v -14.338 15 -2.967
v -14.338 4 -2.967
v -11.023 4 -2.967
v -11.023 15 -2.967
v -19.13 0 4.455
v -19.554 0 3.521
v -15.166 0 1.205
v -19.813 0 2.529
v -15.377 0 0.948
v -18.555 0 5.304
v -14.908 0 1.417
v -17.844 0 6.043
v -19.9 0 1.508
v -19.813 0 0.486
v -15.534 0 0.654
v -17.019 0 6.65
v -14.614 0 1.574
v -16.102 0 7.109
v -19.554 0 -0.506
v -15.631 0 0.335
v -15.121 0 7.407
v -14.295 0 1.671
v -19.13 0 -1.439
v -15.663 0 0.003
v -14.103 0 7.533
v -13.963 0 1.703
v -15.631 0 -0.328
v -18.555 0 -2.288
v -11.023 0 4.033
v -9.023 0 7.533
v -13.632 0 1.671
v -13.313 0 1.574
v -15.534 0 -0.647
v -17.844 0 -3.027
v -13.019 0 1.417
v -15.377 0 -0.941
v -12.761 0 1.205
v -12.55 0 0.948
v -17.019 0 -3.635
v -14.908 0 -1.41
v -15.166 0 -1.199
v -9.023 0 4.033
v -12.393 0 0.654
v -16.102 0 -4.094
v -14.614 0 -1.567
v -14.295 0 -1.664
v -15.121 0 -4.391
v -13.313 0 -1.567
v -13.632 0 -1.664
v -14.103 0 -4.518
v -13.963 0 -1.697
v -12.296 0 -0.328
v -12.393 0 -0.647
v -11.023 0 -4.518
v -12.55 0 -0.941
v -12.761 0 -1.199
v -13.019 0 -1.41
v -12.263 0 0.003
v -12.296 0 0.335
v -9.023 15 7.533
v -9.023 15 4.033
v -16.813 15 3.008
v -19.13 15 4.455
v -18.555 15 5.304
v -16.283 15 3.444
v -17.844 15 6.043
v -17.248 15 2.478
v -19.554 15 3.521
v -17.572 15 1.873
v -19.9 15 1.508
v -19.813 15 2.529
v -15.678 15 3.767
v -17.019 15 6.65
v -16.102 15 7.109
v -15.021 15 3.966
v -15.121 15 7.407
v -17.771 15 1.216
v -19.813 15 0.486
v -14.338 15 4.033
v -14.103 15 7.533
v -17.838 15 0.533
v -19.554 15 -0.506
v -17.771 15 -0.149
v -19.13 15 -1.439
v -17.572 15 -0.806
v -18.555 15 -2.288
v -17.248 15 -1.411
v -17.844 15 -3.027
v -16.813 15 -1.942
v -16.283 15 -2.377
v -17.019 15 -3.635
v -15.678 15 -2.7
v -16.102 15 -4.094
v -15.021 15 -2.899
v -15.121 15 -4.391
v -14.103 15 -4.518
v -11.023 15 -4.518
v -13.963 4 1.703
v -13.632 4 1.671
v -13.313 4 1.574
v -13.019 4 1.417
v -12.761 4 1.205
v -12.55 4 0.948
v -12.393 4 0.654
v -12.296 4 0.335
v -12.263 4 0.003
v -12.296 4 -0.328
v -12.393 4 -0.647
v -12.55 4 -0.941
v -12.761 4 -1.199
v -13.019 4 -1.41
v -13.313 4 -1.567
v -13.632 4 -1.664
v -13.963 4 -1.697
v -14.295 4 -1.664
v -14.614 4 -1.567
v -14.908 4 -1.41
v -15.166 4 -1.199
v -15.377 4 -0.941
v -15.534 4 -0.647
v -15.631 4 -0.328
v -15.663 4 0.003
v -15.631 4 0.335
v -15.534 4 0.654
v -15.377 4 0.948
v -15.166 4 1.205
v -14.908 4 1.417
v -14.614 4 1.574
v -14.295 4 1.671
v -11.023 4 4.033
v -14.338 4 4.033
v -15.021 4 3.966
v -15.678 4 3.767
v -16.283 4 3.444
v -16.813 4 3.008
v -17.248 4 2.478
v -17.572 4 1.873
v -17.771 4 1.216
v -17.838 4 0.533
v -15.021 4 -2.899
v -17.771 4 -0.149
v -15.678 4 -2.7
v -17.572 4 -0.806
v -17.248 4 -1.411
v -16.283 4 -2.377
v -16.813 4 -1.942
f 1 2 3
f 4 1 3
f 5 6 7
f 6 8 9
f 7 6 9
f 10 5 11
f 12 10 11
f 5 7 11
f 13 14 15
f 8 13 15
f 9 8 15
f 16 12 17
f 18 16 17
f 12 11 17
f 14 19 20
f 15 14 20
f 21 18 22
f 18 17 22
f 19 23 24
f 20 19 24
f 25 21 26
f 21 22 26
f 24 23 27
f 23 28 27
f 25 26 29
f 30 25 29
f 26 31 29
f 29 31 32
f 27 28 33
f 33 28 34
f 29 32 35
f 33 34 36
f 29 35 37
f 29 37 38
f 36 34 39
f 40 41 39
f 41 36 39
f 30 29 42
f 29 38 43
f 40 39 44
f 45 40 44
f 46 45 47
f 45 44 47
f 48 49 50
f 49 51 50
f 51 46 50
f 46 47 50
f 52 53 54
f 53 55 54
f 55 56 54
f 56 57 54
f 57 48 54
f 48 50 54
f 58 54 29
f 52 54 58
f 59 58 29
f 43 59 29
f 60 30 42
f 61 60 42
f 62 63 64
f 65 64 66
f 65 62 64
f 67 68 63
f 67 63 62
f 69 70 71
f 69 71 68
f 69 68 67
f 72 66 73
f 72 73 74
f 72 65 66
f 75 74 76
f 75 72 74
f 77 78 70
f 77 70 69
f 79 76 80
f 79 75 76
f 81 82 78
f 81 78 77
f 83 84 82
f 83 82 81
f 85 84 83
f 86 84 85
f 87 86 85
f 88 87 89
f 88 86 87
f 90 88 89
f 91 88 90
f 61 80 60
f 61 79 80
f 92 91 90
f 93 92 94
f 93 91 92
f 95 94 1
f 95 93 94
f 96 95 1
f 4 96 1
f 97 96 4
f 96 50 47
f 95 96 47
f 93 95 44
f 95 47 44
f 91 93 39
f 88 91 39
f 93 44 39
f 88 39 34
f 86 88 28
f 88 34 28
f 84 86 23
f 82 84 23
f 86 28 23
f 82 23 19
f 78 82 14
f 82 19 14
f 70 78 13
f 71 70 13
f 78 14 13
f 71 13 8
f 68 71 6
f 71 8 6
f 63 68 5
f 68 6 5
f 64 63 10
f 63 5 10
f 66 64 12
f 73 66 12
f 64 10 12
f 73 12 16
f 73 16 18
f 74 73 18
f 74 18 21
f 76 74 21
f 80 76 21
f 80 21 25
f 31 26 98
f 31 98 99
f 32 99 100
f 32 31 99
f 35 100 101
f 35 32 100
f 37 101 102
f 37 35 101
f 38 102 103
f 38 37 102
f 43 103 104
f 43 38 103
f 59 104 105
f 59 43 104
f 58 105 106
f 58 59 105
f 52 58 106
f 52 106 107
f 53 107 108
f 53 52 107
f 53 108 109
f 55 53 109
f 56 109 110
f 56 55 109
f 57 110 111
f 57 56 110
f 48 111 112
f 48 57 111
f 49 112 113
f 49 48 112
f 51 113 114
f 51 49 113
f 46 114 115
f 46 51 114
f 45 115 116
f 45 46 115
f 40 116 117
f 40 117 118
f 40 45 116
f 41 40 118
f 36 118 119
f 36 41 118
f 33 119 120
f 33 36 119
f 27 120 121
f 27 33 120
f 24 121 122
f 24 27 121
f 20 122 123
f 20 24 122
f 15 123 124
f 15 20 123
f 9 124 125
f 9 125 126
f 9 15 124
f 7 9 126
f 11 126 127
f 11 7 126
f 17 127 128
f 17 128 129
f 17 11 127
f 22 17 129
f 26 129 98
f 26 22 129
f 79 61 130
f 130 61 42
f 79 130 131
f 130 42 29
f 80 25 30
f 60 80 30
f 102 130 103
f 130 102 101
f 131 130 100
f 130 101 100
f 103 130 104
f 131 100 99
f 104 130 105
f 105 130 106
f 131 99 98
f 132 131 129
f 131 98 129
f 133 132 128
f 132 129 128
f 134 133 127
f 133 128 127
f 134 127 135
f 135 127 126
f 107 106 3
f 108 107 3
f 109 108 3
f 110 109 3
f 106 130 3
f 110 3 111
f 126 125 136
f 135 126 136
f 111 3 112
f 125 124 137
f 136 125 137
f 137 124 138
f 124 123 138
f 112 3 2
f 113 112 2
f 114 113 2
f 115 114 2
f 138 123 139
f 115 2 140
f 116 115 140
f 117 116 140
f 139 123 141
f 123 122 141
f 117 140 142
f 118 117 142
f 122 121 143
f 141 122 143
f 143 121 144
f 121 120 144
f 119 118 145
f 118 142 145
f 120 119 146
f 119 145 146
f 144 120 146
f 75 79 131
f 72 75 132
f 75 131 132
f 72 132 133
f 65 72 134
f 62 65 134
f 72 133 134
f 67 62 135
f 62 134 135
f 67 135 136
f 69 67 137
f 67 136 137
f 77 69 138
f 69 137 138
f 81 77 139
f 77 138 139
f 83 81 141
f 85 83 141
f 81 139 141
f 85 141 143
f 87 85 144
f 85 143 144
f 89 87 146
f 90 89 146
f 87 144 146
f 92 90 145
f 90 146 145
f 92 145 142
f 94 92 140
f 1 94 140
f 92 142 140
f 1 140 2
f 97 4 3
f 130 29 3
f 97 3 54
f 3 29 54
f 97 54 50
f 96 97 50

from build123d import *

# Parameters (mm, degrees)
SKETCH1_R           = 1.7
BOSS_EXTRUDE2_DEPTH = 4
BOSS_EXTRUDE3_DEPTH = 15


with BuildPart() as part:
    # Sketch1 → Boss-Extrude2 (new body)
    with BuildSketch(Plane(origin=(0, 0, 0), x_dir=(1, 0, 0), z_dir=(0, 1, 0))):
        with BuildLine():
            Line((-11.023477569, 2.96663632), (-11.023477569, -4.03336368))
            Line((-11.023477569, -4.03336368), (-14.338233671, -4.03336368))
            ThreePointArc((-14.338233671, -4.03336368), (-17.838233671, -0.53336368), (-14.338233671, 2.96663632))
            Line((-14.338233671, 2.96663632), (-11.023477569, 2.96663632))
        make_face()
        with Locations(Location((-13.963477569, -0.00336368, 0), (0, 0, 270))):
            Circle(SKETCH1_R, mode=Mode.SUBTRACT)
    extrude(amount=BOSS_EXTRUDE2_DEPTH)

    # Sketch2 → Boss-Extrude3 (add)
    with BuildSketch(Plane(origin=(0, 0, 0), x_dir=(1, 0, 0), z_dir=(0, 1, 0))):
        with BuildLine():
            Line((-11.023477569, 2.96663632), (-11.023477569, 4.517571778))
            Line((-11.023477569, 4.517571778), (-14.103477569, 4.517571778))
            ThreePointArc((-14.103477569, 4.517571778), (-19.899728462, -1.507895951), (-14.103477569, -7.53336368))
            Line((-14.103477569, -7.53336368), (-9.023477569, -7.53336368))
            Line((-9.023477569, -7.53336368), (-9.023477569, -4.03336368))
            Line((-9.023477569, -4.03336368), (-11.023477569, -4.03336368))
            Line((-11.023477569, -4.03336368), (-14.338233671, -4.03336368))
            ThreePointArc((-14.338233671, -4.03336368), (-17.838233671, -0.53336368), (-14.338233671, 2.96663632))
            Line((-14.338233671, 2.96663632), (-11.023477569, 2.96663632))
        make_face()
    extrude(amount=BOSS_EXTRUDE3_DEPTH)


solid = part.part
